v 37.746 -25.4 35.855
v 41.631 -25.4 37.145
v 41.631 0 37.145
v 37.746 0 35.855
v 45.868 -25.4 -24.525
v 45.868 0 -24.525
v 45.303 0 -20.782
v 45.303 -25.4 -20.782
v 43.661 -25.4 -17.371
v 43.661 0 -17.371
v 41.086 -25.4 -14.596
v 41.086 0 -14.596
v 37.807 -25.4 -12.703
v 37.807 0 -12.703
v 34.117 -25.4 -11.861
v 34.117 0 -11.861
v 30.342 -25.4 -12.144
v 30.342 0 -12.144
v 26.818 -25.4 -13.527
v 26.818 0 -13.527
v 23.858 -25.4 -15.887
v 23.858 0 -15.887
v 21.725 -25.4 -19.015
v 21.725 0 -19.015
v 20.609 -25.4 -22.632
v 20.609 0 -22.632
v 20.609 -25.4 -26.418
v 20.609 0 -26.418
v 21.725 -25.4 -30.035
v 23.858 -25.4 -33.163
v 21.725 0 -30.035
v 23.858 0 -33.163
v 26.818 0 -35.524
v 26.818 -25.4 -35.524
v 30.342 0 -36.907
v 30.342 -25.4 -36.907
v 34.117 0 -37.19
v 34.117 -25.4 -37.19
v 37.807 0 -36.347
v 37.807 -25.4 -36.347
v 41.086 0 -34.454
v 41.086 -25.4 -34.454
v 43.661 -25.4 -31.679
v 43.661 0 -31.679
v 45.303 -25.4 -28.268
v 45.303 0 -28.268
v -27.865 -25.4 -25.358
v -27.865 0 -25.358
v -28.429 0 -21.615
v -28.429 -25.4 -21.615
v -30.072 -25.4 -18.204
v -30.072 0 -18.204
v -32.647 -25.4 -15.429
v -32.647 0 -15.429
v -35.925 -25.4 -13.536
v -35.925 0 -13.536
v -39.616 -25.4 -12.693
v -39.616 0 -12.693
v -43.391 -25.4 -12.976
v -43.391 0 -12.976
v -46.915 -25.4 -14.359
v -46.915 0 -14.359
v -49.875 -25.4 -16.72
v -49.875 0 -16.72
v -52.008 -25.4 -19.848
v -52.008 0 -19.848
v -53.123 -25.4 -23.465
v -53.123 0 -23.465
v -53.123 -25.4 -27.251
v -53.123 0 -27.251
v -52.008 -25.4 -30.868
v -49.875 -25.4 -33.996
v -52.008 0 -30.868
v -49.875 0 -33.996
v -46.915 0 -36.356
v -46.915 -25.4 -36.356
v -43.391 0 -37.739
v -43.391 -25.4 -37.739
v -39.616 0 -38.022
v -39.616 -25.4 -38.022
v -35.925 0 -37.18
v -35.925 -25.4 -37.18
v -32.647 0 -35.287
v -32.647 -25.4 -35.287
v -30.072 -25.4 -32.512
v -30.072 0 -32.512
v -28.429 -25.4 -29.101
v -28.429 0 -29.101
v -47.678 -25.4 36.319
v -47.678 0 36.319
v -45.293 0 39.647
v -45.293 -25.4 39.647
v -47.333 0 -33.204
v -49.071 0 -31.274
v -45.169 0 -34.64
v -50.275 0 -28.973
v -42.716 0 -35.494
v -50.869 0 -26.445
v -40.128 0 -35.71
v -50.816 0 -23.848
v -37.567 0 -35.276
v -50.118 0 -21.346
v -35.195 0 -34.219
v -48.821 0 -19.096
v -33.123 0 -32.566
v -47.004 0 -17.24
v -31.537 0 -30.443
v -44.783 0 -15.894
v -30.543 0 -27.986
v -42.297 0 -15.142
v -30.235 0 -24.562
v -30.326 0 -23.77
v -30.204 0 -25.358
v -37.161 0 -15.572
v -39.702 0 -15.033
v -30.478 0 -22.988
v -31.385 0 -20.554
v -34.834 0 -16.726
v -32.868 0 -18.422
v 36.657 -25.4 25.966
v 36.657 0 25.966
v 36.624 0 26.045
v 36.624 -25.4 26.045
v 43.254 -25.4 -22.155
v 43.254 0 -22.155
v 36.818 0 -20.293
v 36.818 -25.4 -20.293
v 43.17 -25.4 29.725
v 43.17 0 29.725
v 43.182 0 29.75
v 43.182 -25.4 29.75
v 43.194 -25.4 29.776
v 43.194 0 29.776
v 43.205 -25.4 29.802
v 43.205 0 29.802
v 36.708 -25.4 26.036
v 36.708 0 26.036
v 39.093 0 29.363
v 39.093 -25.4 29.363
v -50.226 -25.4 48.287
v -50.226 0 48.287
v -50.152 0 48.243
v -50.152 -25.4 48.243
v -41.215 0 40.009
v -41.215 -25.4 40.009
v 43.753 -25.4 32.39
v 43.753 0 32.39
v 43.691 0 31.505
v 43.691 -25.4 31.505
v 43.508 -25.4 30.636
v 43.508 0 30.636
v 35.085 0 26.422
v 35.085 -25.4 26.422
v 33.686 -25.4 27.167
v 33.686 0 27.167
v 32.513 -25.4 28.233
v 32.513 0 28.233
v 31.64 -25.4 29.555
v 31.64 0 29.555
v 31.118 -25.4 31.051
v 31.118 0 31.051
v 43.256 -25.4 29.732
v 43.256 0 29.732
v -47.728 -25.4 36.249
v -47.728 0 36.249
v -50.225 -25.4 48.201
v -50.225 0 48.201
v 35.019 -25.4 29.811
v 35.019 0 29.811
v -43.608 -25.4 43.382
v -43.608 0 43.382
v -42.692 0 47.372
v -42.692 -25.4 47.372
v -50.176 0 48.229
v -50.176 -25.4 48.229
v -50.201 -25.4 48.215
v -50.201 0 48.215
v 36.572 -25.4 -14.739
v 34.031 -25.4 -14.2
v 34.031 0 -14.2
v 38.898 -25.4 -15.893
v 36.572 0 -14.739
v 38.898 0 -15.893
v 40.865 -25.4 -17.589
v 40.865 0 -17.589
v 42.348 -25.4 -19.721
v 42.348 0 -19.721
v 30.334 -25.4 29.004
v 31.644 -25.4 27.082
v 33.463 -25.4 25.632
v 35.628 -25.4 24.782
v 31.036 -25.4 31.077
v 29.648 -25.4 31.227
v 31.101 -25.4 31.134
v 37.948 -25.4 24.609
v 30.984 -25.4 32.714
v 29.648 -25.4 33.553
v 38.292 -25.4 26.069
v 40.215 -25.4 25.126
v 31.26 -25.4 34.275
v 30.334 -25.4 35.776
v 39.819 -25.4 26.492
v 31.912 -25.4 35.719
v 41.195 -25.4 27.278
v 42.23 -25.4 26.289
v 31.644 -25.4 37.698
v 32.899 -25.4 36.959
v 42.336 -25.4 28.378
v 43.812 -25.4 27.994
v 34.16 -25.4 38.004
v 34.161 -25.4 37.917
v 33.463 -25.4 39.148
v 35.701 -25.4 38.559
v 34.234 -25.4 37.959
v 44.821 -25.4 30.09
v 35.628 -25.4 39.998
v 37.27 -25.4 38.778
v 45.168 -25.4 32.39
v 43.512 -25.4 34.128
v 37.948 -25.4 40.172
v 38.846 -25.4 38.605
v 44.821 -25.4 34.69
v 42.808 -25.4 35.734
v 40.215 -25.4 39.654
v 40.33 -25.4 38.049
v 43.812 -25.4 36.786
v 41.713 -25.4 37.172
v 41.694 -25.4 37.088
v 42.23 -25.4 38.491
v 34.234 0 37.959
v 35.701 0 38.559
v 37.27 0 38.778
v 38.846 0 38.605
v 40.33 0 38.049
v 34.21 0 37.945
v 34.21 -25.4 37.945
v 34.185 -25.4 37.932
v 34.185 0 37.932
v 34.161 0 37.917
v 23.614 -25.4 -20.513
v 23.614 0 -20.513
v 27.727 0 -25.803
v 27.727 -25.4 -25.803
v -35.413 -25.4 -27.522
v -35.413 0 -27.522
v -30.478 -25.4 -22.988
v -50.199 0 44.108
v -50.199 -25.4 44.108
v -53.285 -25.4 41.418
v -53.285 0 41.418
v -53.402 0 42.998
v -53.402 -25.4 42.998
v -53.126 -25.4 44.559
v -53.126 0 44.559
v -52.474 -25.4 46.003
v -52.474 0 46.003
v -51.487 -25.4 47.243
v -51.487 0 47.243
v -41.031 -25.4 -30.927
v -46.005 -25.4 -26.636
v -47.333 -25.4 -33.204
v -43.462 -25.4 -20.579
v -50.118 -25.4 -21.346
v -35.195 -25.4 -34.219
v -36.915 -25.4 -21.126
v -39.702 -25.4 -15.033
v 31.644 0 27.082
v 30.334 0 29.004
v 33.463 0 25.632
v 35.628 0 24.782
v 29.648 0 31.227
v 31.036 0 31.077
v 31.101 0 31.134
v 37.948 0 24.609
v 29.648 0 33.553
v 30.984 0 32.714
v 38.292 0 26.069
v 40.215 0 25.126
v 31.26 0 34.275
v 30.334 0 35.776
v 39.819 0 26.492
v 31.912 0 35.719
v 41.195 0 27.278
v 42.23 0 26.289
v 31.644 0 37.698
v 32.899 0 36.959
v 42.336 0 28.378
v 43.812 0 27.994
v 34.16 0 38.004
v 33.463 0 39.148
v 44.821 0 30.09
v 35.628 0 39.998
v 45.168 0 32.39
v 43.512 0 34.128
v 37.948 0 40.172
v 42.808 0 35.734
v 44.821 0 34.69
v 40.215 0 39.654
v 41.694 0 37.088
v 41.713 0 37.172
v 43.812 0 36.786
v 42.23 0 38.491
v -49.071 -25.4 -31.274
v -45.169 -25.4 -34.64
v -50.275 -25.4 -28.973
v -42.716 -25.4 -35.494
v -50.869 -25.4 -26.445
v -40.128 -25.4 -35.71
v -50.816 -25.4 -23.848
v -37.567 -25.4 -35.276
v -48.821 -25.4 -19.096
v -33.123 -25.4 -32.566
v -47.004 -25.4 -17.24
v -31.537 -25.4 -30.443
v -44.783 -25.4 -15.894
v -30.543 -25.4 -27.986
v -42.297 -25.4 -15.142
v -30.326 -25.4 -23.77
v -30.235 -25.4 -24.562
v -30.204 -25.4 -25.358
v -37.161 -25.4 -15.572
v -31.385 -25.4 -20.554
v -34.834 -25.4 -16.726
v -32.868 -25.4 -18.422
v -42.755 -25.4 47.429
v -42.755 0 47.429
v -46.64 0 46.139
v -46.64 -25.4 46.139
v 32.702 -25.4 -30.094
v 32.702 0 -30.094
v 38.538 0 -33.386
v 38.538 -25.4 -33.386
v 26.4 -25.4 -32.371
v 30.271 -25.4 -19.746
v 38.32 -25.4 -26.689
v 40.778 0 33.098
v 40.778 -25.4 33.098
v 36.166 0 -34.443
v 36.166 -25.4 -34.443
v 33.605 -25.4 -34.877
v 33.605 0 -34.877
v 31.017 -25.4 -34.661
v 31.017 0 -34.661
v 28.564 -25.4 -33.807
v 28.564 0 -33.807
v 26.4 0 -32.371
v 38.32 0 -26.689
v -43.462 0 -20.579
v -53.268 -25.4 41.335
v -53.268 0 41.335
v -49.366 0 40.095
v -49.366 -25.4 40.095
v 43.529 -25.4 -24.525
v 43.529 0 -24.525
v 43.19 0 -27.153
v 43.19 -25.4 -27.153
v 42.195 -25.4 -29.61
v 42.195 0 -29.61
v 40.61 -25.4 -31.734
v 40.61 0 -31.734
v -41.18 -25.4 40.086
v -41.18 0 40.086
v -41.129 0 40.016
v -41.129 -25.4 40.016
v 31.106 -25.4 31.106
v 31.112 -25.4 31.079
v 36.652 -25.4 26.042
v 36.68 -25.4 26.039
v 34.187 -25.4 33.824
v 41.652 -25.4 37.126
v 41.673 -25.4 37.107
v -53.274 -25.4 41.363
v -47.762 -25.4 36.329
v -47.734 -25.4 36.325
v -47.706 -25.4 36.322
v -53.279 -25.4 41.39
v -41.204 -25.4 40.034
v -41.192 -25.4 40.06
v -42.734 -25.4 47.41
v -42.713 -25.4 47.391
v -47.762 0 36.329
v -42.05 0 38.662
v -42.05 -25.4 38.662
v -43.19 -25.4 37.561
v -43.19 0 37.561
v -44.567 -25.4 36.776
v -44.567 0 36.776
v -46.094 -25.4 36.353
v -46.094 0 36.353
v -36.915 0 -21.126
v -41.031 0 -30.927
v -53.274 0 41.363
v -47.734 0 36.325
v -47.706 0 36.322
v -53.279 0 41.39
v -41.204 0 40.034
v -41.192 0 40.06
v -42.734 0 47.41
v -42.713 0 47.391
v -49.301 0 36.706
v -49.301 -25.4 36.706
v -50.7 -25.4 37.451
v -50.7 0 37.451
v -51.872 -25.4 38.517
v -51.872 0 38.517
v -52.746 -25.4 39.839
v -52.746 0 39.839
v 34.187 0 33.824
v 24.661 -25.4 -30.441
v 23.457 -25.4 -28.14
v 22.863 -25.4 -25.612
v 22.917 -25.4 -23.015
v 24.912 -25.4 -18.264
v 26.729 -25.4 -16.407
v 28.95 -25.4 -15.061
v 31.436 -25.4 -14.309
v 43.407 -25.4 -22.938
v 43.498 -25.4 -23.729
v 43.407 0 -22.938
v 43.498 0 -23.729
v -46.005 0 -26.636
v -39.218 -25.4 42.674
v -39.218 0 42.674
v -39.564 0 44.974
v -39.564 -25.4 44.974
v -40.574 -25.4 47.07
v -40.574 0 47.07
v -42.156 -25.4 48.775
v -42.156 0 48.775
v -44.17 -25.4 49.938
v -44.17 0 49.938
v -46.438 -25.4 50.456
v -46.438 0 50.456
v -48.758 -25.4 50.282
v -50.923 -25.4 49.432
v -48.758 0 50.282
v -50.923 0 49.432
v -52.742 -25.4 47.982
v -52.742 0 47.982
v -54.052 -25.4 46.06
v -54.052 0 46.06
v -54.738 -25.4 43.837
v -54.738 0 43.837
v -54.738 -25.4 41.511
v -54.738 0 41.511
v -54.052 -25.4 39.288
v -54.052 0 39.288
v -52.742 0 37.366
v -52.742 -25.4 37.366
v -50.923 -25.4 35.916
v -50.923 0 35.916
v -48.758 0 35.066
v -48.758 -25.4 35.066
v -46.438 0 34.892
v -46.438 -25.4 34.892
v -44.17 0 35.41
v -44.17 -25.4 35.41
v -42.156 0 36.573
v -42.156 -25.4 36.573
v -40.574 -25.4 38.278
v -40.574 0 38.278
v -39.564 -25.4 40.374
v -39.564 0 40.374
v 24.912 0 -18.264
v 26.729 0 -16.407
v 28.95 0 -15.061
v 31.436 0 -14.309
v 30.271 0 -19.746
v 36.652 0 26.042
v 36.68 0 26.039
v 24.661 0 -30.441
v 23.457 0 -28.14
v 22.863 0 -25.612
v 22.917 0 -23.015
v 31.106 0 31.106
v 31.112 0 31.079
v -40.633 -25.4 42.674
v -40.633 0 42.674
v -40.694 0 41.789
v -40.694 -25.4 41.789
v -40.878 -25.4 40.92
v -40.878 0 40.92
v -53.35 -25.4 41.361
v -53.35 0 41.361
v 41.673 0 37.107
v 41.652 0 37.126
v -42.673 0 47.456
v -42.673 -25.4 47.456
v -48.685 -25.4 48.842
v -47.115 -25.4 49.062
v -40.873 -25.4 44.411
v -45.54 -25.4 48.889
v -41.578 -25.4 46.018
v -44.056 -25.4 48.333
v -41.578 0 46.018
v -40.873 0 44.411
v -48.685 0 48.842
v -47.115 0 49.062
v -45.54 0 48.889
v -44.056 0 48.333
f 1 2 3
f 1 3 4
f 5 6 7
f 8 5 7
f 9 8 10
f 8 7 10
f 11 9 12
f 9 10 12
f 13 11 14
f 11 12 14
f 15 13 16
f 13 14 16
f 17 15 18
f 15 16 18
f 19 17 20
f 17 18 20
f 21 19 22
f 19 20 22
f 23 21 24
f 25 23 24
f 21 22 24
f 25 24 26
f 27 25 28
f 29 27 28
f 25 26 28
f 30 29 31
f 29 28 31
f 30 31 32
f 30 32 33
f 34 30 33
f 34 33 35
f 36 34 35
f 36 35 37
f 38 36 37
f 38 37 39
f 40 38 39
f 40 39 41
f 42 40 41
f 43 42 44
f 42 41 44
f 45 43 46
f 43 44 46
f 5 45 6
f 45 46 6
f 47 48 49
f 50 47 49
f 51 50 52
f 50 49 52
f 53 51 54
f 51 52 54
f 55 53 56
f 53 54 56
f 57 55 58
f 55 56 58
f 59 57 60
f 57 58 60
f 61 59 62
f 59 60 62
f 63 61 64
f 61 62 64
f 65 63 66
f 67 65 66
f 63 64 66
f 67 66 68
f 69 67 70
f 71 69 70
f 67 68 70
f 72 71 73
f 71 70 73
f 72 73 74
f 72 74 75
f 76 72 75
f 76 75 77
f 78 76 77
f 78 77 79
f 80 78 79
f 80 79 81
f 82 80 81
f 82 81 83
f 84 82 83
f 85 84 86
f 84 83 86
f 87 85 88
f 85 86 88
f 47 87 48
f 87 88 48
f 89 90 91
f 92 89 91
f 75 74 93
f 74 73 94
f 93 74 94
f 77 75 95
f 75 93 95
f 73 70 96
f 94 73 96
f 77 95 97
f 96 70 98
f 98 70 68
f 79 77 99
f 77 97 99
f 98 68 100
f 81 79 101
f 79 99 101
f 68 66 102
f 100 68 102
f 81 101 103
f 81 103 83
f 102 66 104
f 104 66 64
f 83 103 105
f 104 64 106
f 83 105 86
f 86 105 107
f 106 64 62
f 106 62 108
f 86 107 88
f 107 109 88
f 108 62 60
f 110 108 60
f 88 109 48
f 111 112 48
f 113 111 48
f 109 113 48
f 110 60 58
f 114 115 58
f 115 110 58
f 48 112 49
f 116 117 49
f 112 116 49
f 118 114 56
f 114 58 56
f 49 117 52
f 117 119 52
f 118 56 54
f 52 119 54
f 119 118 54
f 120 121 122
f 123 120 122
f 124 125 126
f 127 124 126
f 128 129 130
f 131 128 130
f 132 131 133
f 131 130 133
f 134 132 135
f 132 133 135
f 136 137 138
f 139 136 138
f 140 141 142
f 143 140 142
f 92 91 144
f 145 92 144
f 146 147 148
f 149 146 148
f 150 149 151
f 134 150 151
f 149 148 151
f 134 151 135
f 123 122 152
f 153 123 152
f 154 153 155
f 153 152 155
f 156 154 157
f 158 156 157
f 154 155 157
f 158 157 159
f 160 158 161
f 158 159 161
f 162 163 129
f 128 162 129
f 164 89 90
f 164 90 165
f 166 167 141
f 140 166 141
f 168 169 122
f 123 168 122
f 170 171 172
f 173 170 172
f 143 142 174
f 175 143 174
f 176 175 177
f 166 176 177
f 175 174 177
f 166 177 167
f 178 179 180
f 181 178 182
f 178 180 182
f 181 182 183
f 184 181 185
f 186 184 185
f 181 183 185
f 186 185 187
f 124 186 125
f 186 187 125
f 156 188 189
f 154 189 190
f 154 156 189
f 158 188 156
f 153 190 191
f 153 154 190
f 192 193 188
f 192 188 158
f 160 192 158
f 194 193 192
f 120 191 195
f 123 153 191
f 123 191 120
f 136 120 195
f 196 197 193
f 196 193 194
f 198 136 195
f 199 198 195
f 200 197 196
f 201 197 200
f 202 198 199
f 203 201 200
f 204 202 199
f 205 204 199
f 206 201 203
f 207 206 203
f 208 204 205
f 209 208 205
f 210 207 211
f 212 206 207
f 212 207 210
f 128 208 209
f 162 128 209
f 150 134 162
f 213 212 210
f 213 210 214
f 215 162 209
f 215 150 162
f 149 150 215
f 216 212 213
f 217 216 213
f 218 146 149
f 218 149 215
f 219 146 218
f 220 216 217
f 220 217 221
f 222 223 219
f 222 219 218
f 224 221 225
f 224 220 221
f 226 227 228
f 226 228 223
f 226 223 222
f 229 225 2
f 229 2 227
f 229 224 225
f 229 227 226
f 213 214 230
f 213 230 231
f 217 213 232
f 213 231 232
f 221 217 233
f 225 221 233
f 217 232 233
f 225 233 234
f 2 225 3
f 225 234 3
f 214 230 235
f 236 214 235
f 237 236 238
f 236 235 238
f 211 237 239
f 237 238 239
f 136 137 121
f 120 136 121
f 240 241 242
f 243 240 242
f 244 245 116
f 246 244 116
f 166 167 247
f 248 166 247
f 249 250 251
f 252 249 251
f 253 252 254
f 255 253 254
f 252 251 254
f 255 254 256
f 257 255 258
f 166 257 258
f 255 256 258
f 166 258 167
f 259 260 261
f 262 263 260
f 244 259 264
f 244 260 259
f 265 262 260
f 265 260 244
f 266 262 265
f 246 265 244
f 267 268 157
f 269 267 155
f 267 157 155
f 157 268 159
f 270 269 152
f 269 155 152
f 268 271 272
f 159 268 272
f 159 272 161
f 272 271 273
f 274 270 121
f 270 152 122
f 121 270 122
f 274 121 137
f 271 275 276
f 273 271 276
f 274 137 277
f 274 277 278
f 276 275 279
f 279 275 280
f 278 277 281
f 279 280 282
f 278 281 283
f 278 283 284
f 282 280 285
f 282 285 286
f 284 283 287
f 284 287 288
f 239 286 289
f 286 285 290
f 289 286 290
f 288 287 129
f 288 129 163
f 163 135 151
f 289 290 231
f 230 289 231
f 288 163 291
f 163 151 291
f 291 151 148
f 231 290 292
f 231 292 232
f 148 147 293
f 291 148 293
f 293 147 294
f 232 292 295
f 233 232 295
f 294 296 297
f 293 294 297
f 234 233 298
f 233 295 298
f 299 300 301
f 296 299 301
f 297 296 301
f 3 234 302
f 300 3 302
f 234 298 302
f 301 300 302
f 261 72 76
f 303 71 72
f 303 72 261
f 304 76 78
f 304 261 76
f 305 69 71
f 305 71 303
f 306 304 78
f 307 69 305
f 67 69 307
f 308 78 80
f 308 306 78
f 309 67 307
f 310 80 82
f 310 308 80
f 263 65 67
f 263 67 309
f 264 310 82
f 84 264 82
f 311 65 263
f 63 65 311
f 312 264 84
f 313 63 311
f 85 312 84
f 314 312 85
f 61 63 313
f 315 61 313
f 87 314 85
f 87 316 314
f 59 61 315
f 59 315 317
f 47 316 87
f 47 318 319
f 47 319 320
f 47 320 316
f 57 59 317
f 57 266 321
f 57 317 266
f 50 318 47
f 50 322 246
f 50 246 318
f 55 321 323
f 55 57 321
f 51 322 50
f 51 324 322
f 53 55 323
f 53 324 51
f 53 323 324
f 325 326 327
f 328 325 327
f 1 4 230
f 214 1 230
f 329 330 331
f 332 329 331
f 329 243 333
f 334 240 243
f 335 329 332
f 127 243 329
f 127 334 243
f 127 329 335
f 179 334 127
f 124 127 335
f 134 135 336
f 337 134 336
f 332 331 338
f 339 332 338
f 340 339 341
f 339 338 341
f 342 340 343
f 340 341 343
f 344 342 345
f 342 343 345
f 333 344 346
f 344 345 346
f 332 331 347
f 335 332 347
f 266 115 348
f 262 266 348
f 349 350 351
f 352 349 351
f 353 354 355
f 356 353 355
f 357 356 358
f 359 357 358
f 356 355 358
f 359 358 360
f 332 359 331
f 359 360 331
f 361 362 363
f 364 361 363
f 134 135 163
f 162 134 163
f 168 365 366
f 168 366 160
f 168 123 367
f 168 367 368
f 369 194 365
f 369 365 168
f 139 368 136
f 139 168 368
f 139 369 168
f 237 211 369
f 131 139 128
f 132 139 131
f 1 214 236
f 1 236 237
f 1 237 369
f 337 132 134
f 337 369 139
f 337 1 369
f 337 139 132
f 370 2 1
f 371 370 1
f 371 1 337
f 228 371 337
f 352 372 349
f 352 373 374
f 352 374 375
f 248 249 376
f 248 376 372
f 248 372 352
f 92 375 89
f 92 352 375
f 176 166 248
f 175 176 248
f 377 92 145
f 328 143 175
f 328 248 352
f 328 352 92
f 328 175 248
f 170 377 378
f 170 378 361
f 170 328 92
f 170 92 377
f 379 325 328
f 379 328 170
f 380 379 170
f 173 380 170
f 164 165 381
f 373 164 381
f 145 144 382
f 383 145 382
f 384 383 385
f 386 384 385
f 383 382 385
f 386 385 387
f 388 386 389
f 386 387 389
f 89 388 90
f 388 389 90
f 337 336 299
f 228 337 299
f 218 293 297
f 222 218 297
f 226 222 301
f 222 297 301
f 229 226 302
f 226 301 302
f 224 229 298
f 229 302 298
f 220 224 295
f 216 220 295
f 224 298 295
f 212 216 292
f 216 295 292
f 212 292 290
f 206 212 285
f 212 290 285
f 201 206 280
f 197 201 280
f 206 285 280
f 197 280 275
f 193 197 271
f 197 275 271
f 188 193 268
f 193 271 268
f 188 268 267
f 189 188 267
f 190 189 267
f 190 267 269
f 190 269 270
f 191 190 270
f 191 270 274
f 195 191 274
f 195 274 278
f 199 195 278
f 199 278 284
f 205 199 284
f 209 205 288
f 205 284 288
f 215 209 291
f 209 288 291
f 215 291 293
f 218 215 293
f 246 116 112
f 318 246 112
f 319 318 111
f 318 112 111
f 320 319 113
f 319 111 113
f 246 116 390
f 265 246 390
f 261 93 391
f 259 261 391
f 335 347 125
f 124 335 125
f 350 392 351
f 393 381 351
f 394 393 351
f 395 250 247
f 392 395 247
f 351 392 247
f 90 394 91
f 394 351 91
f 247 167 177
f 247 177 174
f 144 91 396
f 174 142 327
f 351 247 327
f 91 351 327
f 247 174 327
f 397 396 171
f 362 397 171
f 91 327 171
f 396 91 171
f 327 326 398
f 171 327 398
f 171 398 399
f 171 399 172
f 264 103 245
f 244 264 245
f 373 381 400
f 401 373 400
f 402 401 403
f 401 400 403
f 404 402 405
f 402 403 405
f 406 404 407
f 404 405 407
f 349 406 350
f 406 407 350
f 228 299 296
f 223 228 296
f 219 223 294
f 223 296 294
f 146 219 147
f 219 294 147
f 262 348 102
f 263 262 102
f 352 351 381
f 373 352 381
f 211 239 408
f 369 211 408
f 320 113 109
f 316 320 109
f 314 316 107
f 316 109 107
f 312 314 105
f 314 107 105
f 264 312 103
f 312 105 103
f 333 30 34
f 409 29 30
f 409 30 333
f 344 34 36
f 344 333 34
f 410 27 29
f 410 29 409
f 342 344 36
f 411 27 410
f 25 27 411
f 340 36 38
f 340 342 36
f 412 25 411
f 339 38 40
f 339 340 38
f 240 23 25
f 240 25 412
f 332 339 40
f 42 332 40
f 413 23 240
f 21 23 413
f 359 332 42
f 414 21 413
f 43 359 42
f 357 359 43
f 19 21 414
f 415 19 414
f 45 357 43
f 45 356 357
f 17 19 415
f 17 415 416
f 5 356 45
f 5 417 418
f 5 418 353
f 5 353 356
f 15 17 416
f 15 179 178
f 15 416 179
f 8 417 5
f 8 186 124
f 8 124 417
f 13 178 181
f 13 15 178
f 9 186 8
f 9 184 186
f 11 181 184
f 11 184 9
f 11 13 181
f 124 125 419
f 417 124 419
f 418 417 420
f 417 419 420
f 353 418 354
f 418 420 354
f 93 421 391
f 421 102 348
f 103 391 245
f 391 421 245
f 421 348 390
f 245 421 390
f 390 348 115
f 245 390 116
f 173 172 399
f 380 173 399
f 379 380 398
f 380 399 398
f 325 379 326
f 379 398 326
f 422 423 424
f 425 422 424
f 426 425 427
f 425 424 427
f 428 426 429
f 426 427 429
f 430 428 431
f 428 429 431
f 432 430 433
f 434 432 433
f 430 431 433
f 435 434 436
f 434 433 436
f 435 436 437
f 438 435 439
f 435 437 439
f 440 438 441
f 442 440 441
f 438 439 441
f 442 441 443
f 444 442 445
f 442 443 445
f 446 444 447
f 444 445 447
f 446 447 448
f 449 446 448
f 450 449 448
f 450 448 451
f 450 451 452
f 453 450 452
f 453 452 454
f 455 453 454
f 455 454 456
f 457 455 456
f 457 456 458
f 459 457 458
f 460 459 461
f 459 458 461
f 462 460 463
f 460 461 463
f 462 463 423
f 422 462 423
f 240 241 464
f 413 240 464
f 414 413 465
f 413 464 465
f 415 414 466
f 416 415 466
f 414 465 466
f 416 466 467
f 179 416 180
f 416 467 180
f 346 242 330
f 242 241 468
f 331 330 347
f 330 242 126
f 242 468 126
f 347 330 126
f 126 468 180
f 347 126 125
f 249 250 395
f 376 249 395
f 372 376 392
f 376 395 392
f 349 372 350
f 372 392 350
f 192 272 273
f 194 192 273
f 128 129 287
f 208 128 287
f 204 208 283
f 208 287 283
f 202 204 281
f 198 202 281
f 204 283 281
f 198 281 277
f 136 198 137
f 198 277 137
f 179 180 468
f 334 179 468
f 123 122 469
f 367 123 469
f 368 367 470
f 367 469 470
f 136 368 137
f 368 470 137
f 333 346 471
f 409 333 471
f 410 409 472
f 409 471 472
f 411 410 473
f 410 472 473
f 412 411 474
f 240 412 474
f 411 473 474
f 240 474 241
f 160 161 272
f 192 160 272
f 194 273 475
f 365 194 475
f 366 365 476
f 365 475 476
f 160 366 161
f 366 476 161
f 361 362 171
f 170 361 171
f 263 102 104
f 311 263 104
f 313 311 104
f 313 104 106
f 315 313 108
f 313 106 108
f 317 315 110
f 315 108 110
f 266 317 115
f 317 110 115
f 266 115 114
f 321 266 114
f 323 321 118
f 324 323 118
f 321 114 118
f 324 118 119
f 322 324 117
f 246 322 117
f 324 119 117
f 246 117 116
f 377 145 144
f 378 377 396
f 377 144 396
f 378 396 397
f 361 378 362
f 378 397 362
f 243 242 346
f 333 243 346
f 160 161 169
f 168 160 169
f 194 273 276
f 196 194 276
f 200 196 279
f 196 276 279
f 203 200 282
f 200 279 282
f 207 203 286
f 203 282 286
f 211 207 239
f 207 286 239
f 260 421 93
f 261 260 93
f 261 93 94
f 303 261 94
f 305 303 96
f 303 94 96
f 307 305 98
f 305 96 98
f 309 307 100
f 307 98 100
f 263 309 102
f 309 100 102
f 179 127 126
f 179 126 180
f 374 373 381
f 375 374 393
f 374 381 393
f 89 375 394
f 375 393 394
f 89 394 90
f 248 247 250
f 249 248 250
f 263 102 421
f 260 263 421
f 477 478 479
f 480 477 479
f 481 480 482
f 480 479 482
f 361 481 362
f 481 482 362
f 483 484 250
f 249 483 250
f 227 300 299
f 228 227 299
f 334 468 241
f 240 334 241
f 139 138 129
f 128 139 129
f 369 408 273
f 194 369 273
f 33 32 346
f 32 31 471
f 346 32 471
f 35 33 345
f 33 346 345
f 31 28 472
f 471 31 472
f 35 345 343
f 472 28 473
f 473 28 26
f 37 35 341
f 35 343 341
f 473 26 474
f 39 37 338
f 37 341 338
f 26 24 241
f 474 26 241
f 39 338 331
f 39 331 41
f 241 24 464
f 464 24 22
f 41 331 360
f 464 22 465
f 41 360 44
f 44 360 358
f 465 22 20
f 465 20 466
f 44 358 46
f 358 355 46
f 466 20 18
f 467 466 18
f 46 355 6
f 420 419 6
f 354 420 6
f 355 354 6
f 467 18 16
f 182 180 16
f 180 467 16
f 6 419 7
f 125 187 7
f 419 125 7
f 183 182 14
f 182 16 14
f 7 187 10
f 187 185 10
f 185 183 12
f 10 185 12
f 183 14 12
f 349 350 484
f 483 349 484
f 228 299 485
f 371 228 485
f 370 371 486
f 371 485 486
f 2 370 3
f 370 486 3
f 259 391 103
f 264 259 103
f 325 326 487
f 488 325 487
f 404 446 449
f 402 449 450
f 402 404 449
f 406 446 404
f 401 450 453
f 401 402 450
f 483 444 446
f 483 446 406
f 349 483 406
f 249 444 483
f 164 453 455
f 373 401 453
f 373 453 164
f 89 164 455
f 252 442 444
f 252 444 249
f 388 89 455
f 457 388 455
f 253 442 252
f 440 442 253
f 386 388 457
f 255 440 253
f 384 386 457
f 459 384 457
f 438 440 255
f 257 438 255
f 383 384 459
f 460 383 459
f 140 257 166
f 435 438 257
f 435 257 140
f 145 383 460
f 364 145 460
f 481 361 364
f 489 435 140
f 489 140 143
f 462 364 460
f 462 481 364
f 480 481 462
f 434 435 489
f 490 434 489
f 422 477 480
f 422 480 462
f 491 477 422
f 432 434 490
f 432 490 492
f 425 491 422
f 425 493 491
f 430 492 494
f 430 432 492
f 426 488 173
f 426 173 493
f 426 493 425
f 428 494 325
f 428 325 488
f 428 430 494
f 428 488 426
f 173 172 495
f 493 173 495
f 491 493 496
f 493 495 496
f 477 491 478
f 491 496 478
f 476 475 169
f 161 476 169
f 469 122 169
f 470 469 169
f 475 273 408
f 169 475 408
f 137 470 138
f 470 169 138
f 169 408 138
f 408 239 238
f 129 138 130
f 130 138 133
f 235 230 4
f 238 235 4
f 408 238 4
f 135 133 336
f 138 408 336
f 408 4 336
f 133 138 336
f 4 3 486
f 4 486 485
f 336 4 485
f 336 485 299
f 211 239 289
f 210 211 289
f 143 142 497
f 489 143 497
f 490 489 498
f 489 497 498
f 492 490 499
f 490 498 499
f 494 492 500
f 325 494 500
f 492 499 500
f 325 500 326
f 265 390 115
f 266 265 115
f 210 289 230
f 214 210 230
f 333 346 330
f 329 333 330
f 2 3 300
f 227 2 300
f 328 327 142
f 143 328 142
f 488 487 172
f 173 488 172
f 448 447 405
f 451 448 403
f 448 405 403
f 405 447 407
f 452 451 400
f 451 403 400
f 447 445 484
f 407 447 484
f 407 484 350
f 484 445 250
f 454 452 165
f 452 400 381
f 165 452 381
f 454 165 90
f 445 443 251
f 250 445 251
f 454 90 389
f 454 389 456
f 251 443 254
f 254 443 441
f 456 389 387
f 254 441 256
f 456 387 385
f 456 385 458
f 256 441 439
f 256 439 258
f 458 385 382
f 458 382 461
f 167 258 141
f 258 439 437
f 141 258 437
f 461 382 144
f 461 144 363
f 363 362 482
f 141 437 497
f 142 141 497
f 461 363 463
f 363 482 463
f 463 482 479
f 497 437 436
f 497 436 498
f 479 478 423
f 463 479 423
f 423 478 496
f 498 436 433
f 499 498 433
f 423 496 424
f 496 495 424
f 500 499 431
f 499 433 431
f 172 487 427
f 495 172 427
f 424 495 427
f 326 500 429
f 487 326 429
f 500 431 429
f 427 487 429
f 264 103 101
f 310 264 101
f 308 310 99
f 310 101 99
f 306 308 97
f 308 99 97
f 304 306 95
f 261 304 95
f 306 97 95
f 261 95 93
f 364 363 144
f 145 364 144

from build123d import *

# Parameters (mm, degrees)
F0_R     = 7.8035976044
F1_DEPTH = 25.4
F0_R_2   = 12.7


with BuildPart() as f1:
    # F0 (on Front) → F1 (new body)
    with BuildSketch(Plane.XZ):
        with Locations((-47.0211860416, 42.674090528)):
            Circle(F0_R)
        with BuildLine():
            ThreePointArc((-42.6920368305, 47.3722329839), (-41.1700651022, 45.238941241), (-40.6325965707, 42.674090528))
            ThreePointArc((-40.6325965707, 42.674090528), (-40.7710648077, 41.3511921991), (-41.1804671129, 40.085639674))
            Line((-41.1804671129, 40.085639674), (-41.1293756872, 40.0162519683))
            Line((-41.1293756872, 40.0162519683), (-41.2152063671, 40.0086308216))
            ThreePointArc((-41.2152063671, 40.0086308216), (-43.8540138331, 37.1258389449), (-47.6780676851, 36.319361428))
            Line((-47.6780676851, 36.319361428), (-47.7282711959, 36.2493286144))
            Line((-47.7282711959, 36.2493286144), (-47.7620424759, 36.3286033779))
            ThreePointArc((-47.7620424759, 36.3286033779), (-51.3191768273, 37.9474267326), (-53.2678801526, 41.3351028089))
            Line((-53.2678801526, 41.3351028089), (-53.3499990543, 41.3612078554))
            Line((-53.3499990543, 41.3612078554), (-53.2850401734, 41.4178235005))
            ThreePointArc((-53.2850401734, 41.4178235005), (-52.844662639, 45.3011032322), (-50.2249736761, 48.2012797071))
            Line((-50.2249736761, 48.2012797071), (-50.2255224376, 48.2874463267))
            Line((-50.2255224376, 48.2874463267), (-50.1516043614, 48.2431619561))
            ThreePointArc((-50.1516043614, 48.2431619561), (-46.3223017258, 49.0243374634), (-42.7545415815, 47.429069022))
            Line((-42.7545415815, 47.429069022), (-42.672761833, 47.4562178751))
            Line((-42.672761833, 47.4562178751), (-42.6920368305, 47.3722329839))
        make_face(mode=Mode.SUBTRACT)
    extrude(amount=F1_DEPTH)


with BuildPart() as f1b:
    # F0 (on Front) → F1, piece 2 (new body)
    with BuildSketch(Plane.XZ):
        with BuildLine():
            ThreePointArc((-41.2152063671, 40.0086308216), (-41.1977094443, 40.0470778238), (-41.1804671129, 40.085639674))
            Line((-41.1804671129, 40.085639674), (-43.6077745206, 43.3821867905))
            ThreePointArc((-43.6077745206, 43.3821867905), (-43.5533180881, 43.0299983605), (-43.5351024901, 42.674090528))
            ThreePointArc((-43.5351024901, 42.674090528), (-44.0064245578, 40.9236643729), (-45.2929443083, 39.6465570369))
            Line((-45.2929443083, 39.6465570369), (-41.2152063671, 40.0086308216))
        make_face()
        with BuildLine():
            ThreePointArc((-43.5351024901, 42.674090528), (-43.5533180881, 43.0299983605), (-43.6077745206, 43.3821867905))
            ThreePointArc((-43.6077745206, 43.3821867905), (-44.6758866526, 45.25330539), (-46.6398234374, 46.1392515766))
            ThreePointArc((-46.6398234374, 46.1392515766), (-48.749427775, 45.7016240191), (-50.1989025112, 44.10758157))
            ThreePointArc((-50.1989025112, 44.10758157), (-50.4345975626, 41.9659942655), (-49.3664854306, 40.094875666))
            ThreePointArc((-49.3664854306, 40.094875666), (-47.4025486458, 39.2089294794), (-45.2929443083, 39.6465570369))
            ThreePointArc((-45.2929443083, 39.6465570369), (-44.0064245578, 40.9236643729), (-43.5351024901, 42.674090528))
        make_face()
        with BuildLine():
            ThreePointArc((-47.7620424759, 36.3286033779), (-47.7200703574, 36.3238435925), (-47.6780676851, 36.319361428))
            Line((-47.6780676851, 36.319361428), (-45.2929443083, 39.6465570369))
            ThreePointArc((-45.2929443083, 39.6465570369), (-47.4025486458, 39.2089294794), (-49.3664854306, 40.094875666))
            Line((-49.3664854306, 40.094875666), (-47.7620424759, 36.3286033779))
        make_face()
        with BuildLine():
            ThreePointArc((-49.3664854306, 40.094875666), (-50.4345975626, 41.9659942655), (-50.1989025112, 44.10758157))
            Line((-50.1989025112, 44.10758157), (-53.2850401734, 41.4178235005))
            ThreePointArc((-53.2850401734, 41.4178235005), (-53.2765969004, 41.3764347891), (-53.2678801526, 41.3351028089))
            Line((-53.2678801526, 41.3351028089), (-49.3664854306, 40.094875666))
        make_face()
        with BuildLine():
            Line((-46.6398234374, 46.1392515766), (-50.1516043614, 48.2431619561))
            ThreePointArc((-50.1516043614, 48.2431619561), (-50.1883582501, 48.2223421111), (-50.2249736761, 48.2012797071))
            Line((-50.2249736761, 48.2012797071), (-50.1989025112, 44.10758157))
            ThreePointArc((-50.1989025112, 44.10758157), (-48.749427775, 45.7016240191), (-46.6398234374, 46.1392515766))
        make_face()
        with BuildLine():
            Line((-43.6077745206, 43.3821867905), (-42.6920368305, 47.3722329839))
            ThreePointArc((-42.6920368305, 47.3722329839), (-42.723195256, 47.4007543234), (-42.7545415815, 47.429069022))
            Line((-42.7545415815, 47.429069022), (-46.6398234374, 46.1392515766))
            ThreePointArc((-46.6398234374, 46.1392515766), (-44.6758866526, 45.25330539), (-43.6077745206, 43.3821867905))
        make_face()
    extrude(amount=F1_DEPTH)


with BuildPart() as f1c:
    # F0 (on Front) → F1, piece 3 (new body)
    with BuildSketch(Plane.XZ):
        with BuildLine():
            ThreePointArc((43.1704565667, 29.7248177096), (43.1879534895, 29.7632647118), (43.2051958208, 29.801826562))
            Line((43.2051958208, 29.801826562), (40.7778884131, 33.0983736784))
            ThreePointArc((40.7778884131, 33.0983736784), (40.8323448457, 32.7461852485), (40.8505604437, 32.390277416))
            ThreePointArc((40.8505604437, 32.390277416), (40.3792383759, 30.6398512609), (39.0927186255, 29.3627439249))
            Line((39.0927186255, 29.3627439249), (43.1704565667, 29.7248177096))
        make_face()
        with BuildLine():
            ThreePointArc((36.6236204579, 26.0447902659), (36.6655925763, 26.0400304805), (36.7075952487, 26.035548316))
            Line((36.7075952487, 26.035548316), (39.0927186255, 29.3627439249))
            ThreePointArc((39.0927186255, 29.3627439249), (36.9831142879, 28.9251163674), (35.0191775031, 29.8110625539))
            Line((35.0191775031, 29.8110625539), (36.6236204579, 26.0447902659))
        make_face()
        with BuildLine():
            ThreePointArc((40.8505604437, 32.390277416), (40.8323448457, 32.7461852485), (40.7778884131, 33.0983736784))
            ThreePointArc((40.7778884131, 33.0983736784), (39.7097762811, 34.969492278), (37.7458394963, 35.8554384646))
            ThreePointArc((37.7458394963, 35.8554384646), (35.6362351587, 35.417810907), (34.1867604225, 33.823768458))
            ThreePointArc((34.1867604225, 33.823768458), (33.9510653711, 31.6821811535), (35.0191775031, 29.8110625539))
            ThreePointArc((35.0191775031, 29.8110625539), (36.9831142879, 28.9251163674), (39.0927186255, 29.3627439249))
            ThreePointArc((39.0927186255, 29.3627439249), (40.3792383759, 30.6398512609), (40.8505604437, 32.390277416))
        make_face()
        with BuildLine():
            ThreePointArc((35.0191775031, 29.8110625539), (33.9510653711, 31.6821811535), (34.1867604225, 33.823768458))
            Line((34.1867604225, 33.823768458), (31.1006227604, 31.1340103884))
            ThreePointArc((31.1006227604, 31.1340103884), (31.1090660334, 31.0926216771), (31.1177827811, 31.0512896969))
            Line((31.1177827811, 31.0512896969), (35.0191775031, 29.8110625539))
        make_face()
        with BuildLine():
            Line((37.7458394963, 35.8554384646), (34.2340585724, 37.9593488441))
            ThreePointArc((34.2340585724, 37.9593488441), (34.1973046836, 37.9385289991), (34.1606892577, 37.917466595))
            Line((34.1606892577, 37.917466595), (34.1867604225, 33.823768458))
            ThreePointArc((34.1867604225, 33.823768458), (35.6362351587, 35.417810907), (37.7458394963, 35.8554384646))
        make_face()
        with BuildLine():
            Line((40.7778884131, 33.0983736784), (41.6936261032, 37.0884198719))
            ThreePointArc((41.6936261032, 37.0884198719), (41.6624676778, 37.1169412113), (41.6311213523, 37.14525591))
            Line((41.6311213523, 37.14525591), (37.7458394963, 35.8554384646))
            ThreePointArc((37.7458394963, 35.8554384646), (39.7097762811, 34.969492278), (40.7778884131, 33.0983736784))
        make_face()
    extrude(amount=F1_DEPTH)


with BuildPart() as f1d:
    # F0 (on Front) → F1, piece 4 (new body)
    with BuildSketch(Plane.XZ):
        with Locations((37.3644768921, 32.390277416)):
            Circle(F0_R)
        with BuildLine():
            ThreePointArc((41.6936261032, 37.0884198719), (43.2155978316, 34.9551281289), (43.753066363, 32.390277416))
            ThreePointArc((43.753066363, 32.390277416), (43.6145981261, 31.0673790871), (43.2051958208, 29.801826562))
            Line((43.2051958208, 29.801826562), (43.2562872465, 29.7324388563))
            Line((43.2562872465, 29.7324388563), (43.1704565667, 29.7248177096))
            ThreePointArc((43.1704565667, 29.7248177096), (40.5316491006, 26.8420258328), (36.7075952487, 26.035548316))
            Line((36.7075952487, 26.035548316), (36.6573917378, 25.9655155024))
            Line((36.6573917378, 25.9655155024), (36.6236204579, 26.0447902659))
            ThreePointArc((36.6236204579, 26.0447902659), (33.0664861065, 27.6636136206), (31.1177827811, 31.0512896969))
            Line((31.1177827811, 31.0512896969), (31.0356638794, 31.0773947434))
            Line((31.0356638794, 31.0773947434), (31.1006227604, 31.1340103884))
            ThreePointArc((31.1006227604, 31.1340103884), (31.5410002948, 35.0172901202), (34.1606892577, 37.917466595))
            Line((34.1606892577, 37.917466595), (34.1601404961, 38.0036332147))
            Line((34.1601404961, 38.0036332147), (34.2340585724, 37.9593488441))
            ThreePointArc((34.2340585724, 37.9593488441), (38.0633612079, 38.7405243514), (41.6311213523, 37.14525591))
            Line((41.6311213523, 37.14525591), (41.7129011007, 37.1724047631))
            Line((41.7129011007, 37.1724047631), (41.6936261032, 37.0884198719))
        make_face(mode=Mode.SUBTRACT)
    extrude(amount=F1_DEPTH)


with BuildPart() as f1e:
    # F0 (on Front) → F1, piece 5 (new body)
    with BuildSketch(Plane.XZ):
        with Locations((-40.5652014311, -25.3579147756)):
            Circle(F0_R_2)
        with BuildLine():
            ThreePointArc((-30.4784917314, -22.9882899115), (-30.2727672128, -24.1651732175), (-30.2038871051, -25.3579147756))
            ThreePointArc((-30.2038871051, -25.3579147756), (-31.5373713373, -30.4427076289), (-35.1945895483, -34.2186914102))
            ThreePointArc((-35.1945895483, -34.2186914102), (-41.4285189774, -35.6832001168), (-47.3326904468, -33.2038007667))
            ThreePointArc((-47.3326904468, -33.2038007667), (-50.6519111307, -27.7275396398), (-50.1183515441, -21.3461623554))
            ThreePointArc((-50.1183515441, -21.3461623554), (-45.9358133139, -16.4971381411), (-39.7018838848, -15.0326294345))
            ThreePointArc((-39.7018838848, -15.0326294345), (-33.7977124154, -17.5120287846), (-30.4784917314, -22.9882899115))
        make_face(mode=Mode.SUBTRACT)
    extrude(amount=F1_DEPTH)


with BuildPart() as f1f:
    # F0 (on Front) → F1, piece 6 (new body)
    with BuildSketch(Plane.XZ):
        Polygon((-35.4127609036, -27.5216320324), (-30.4784917314, -22.9882899115), (-36.9151923491, -21.1262780405), (-39.7018838848, -15.0326294345), (-43.4618122867, -20.5789021885), (-50.1183515441, -21.3461623554), (-46.005414474, -26.6359592992), (-47.3326904468, -33.2038007667), (-41.0308271421, -30.9268023175), (-35.1945895483, -34.2186914102), align=None)
    extrude(amount=F1_DEPTH)


with BuildPart() as f1g:
    # F0 (on Front) → F1, piece 7 (new body)
    with BuildSketch(Plane.XZ):
        with Locations((33.1675457677, -24.5250859791)):
            Circle(F0_R_2)
        with BuildLine():
            ThreePointArc((43.2542554674, -22.1554611149), (43.459979986, -23.332344421), (43.5288600937, -24.5250859791))
            ThreePointArc((43.5288600937, -24.5250859791), (42.1953758614, -29.6098788324), (38.5381576505, -33.3858626136))
            ThreePointArc((38.5381576505, -33.3858626136), (32.3042282214, -34.8503713202), (26.400056752, -32.3709719701))
            ThreePointArc((26.400056752, -32.3709719701), (23.080836068, -26.8947108432), (23.6143956547, -20.5133335589))
            ThreePointArc((23.6143956547, -20.5133335589), (27.7969338849, -15.6643093445), (34.030863314, -14.1998006379))
            ThreePointArc((34.030863314, -14.1998006379), (39.9350347834, -16.679199988), (43.2542554674, -22.1554611149))
        make_face(mode=Mode.SUBTRACT)
    extrude(amount=F1_DEPTH)


with BuildPart() as f1h:
    # F0 (on Front) → F1, piece 8 (new body)
    with BuildSketch(Plane.XZ):
        Polygon((38.3199862952, -26.6888032358), (43.2542554674, -22.1554611149), (36.8175548497, -20.293449244), (34.030863314, -14.1998006379), (30.2709349121, -19.7460733919), (23.6143956547, -20.5133335589), (27.7273327248, -25.8031305027), (26.400056752, -32.3709719701), (32.7019200567, -30.0939735209), (38.5381576505, -33.3858626136), align=None)
    extrude(amount=F1_DEPTH)


solid = Compound([f1.part, f1b.part, f1c.part, f1d.part, f1e.part, f1f.part, f1g.part, f1h.part])
